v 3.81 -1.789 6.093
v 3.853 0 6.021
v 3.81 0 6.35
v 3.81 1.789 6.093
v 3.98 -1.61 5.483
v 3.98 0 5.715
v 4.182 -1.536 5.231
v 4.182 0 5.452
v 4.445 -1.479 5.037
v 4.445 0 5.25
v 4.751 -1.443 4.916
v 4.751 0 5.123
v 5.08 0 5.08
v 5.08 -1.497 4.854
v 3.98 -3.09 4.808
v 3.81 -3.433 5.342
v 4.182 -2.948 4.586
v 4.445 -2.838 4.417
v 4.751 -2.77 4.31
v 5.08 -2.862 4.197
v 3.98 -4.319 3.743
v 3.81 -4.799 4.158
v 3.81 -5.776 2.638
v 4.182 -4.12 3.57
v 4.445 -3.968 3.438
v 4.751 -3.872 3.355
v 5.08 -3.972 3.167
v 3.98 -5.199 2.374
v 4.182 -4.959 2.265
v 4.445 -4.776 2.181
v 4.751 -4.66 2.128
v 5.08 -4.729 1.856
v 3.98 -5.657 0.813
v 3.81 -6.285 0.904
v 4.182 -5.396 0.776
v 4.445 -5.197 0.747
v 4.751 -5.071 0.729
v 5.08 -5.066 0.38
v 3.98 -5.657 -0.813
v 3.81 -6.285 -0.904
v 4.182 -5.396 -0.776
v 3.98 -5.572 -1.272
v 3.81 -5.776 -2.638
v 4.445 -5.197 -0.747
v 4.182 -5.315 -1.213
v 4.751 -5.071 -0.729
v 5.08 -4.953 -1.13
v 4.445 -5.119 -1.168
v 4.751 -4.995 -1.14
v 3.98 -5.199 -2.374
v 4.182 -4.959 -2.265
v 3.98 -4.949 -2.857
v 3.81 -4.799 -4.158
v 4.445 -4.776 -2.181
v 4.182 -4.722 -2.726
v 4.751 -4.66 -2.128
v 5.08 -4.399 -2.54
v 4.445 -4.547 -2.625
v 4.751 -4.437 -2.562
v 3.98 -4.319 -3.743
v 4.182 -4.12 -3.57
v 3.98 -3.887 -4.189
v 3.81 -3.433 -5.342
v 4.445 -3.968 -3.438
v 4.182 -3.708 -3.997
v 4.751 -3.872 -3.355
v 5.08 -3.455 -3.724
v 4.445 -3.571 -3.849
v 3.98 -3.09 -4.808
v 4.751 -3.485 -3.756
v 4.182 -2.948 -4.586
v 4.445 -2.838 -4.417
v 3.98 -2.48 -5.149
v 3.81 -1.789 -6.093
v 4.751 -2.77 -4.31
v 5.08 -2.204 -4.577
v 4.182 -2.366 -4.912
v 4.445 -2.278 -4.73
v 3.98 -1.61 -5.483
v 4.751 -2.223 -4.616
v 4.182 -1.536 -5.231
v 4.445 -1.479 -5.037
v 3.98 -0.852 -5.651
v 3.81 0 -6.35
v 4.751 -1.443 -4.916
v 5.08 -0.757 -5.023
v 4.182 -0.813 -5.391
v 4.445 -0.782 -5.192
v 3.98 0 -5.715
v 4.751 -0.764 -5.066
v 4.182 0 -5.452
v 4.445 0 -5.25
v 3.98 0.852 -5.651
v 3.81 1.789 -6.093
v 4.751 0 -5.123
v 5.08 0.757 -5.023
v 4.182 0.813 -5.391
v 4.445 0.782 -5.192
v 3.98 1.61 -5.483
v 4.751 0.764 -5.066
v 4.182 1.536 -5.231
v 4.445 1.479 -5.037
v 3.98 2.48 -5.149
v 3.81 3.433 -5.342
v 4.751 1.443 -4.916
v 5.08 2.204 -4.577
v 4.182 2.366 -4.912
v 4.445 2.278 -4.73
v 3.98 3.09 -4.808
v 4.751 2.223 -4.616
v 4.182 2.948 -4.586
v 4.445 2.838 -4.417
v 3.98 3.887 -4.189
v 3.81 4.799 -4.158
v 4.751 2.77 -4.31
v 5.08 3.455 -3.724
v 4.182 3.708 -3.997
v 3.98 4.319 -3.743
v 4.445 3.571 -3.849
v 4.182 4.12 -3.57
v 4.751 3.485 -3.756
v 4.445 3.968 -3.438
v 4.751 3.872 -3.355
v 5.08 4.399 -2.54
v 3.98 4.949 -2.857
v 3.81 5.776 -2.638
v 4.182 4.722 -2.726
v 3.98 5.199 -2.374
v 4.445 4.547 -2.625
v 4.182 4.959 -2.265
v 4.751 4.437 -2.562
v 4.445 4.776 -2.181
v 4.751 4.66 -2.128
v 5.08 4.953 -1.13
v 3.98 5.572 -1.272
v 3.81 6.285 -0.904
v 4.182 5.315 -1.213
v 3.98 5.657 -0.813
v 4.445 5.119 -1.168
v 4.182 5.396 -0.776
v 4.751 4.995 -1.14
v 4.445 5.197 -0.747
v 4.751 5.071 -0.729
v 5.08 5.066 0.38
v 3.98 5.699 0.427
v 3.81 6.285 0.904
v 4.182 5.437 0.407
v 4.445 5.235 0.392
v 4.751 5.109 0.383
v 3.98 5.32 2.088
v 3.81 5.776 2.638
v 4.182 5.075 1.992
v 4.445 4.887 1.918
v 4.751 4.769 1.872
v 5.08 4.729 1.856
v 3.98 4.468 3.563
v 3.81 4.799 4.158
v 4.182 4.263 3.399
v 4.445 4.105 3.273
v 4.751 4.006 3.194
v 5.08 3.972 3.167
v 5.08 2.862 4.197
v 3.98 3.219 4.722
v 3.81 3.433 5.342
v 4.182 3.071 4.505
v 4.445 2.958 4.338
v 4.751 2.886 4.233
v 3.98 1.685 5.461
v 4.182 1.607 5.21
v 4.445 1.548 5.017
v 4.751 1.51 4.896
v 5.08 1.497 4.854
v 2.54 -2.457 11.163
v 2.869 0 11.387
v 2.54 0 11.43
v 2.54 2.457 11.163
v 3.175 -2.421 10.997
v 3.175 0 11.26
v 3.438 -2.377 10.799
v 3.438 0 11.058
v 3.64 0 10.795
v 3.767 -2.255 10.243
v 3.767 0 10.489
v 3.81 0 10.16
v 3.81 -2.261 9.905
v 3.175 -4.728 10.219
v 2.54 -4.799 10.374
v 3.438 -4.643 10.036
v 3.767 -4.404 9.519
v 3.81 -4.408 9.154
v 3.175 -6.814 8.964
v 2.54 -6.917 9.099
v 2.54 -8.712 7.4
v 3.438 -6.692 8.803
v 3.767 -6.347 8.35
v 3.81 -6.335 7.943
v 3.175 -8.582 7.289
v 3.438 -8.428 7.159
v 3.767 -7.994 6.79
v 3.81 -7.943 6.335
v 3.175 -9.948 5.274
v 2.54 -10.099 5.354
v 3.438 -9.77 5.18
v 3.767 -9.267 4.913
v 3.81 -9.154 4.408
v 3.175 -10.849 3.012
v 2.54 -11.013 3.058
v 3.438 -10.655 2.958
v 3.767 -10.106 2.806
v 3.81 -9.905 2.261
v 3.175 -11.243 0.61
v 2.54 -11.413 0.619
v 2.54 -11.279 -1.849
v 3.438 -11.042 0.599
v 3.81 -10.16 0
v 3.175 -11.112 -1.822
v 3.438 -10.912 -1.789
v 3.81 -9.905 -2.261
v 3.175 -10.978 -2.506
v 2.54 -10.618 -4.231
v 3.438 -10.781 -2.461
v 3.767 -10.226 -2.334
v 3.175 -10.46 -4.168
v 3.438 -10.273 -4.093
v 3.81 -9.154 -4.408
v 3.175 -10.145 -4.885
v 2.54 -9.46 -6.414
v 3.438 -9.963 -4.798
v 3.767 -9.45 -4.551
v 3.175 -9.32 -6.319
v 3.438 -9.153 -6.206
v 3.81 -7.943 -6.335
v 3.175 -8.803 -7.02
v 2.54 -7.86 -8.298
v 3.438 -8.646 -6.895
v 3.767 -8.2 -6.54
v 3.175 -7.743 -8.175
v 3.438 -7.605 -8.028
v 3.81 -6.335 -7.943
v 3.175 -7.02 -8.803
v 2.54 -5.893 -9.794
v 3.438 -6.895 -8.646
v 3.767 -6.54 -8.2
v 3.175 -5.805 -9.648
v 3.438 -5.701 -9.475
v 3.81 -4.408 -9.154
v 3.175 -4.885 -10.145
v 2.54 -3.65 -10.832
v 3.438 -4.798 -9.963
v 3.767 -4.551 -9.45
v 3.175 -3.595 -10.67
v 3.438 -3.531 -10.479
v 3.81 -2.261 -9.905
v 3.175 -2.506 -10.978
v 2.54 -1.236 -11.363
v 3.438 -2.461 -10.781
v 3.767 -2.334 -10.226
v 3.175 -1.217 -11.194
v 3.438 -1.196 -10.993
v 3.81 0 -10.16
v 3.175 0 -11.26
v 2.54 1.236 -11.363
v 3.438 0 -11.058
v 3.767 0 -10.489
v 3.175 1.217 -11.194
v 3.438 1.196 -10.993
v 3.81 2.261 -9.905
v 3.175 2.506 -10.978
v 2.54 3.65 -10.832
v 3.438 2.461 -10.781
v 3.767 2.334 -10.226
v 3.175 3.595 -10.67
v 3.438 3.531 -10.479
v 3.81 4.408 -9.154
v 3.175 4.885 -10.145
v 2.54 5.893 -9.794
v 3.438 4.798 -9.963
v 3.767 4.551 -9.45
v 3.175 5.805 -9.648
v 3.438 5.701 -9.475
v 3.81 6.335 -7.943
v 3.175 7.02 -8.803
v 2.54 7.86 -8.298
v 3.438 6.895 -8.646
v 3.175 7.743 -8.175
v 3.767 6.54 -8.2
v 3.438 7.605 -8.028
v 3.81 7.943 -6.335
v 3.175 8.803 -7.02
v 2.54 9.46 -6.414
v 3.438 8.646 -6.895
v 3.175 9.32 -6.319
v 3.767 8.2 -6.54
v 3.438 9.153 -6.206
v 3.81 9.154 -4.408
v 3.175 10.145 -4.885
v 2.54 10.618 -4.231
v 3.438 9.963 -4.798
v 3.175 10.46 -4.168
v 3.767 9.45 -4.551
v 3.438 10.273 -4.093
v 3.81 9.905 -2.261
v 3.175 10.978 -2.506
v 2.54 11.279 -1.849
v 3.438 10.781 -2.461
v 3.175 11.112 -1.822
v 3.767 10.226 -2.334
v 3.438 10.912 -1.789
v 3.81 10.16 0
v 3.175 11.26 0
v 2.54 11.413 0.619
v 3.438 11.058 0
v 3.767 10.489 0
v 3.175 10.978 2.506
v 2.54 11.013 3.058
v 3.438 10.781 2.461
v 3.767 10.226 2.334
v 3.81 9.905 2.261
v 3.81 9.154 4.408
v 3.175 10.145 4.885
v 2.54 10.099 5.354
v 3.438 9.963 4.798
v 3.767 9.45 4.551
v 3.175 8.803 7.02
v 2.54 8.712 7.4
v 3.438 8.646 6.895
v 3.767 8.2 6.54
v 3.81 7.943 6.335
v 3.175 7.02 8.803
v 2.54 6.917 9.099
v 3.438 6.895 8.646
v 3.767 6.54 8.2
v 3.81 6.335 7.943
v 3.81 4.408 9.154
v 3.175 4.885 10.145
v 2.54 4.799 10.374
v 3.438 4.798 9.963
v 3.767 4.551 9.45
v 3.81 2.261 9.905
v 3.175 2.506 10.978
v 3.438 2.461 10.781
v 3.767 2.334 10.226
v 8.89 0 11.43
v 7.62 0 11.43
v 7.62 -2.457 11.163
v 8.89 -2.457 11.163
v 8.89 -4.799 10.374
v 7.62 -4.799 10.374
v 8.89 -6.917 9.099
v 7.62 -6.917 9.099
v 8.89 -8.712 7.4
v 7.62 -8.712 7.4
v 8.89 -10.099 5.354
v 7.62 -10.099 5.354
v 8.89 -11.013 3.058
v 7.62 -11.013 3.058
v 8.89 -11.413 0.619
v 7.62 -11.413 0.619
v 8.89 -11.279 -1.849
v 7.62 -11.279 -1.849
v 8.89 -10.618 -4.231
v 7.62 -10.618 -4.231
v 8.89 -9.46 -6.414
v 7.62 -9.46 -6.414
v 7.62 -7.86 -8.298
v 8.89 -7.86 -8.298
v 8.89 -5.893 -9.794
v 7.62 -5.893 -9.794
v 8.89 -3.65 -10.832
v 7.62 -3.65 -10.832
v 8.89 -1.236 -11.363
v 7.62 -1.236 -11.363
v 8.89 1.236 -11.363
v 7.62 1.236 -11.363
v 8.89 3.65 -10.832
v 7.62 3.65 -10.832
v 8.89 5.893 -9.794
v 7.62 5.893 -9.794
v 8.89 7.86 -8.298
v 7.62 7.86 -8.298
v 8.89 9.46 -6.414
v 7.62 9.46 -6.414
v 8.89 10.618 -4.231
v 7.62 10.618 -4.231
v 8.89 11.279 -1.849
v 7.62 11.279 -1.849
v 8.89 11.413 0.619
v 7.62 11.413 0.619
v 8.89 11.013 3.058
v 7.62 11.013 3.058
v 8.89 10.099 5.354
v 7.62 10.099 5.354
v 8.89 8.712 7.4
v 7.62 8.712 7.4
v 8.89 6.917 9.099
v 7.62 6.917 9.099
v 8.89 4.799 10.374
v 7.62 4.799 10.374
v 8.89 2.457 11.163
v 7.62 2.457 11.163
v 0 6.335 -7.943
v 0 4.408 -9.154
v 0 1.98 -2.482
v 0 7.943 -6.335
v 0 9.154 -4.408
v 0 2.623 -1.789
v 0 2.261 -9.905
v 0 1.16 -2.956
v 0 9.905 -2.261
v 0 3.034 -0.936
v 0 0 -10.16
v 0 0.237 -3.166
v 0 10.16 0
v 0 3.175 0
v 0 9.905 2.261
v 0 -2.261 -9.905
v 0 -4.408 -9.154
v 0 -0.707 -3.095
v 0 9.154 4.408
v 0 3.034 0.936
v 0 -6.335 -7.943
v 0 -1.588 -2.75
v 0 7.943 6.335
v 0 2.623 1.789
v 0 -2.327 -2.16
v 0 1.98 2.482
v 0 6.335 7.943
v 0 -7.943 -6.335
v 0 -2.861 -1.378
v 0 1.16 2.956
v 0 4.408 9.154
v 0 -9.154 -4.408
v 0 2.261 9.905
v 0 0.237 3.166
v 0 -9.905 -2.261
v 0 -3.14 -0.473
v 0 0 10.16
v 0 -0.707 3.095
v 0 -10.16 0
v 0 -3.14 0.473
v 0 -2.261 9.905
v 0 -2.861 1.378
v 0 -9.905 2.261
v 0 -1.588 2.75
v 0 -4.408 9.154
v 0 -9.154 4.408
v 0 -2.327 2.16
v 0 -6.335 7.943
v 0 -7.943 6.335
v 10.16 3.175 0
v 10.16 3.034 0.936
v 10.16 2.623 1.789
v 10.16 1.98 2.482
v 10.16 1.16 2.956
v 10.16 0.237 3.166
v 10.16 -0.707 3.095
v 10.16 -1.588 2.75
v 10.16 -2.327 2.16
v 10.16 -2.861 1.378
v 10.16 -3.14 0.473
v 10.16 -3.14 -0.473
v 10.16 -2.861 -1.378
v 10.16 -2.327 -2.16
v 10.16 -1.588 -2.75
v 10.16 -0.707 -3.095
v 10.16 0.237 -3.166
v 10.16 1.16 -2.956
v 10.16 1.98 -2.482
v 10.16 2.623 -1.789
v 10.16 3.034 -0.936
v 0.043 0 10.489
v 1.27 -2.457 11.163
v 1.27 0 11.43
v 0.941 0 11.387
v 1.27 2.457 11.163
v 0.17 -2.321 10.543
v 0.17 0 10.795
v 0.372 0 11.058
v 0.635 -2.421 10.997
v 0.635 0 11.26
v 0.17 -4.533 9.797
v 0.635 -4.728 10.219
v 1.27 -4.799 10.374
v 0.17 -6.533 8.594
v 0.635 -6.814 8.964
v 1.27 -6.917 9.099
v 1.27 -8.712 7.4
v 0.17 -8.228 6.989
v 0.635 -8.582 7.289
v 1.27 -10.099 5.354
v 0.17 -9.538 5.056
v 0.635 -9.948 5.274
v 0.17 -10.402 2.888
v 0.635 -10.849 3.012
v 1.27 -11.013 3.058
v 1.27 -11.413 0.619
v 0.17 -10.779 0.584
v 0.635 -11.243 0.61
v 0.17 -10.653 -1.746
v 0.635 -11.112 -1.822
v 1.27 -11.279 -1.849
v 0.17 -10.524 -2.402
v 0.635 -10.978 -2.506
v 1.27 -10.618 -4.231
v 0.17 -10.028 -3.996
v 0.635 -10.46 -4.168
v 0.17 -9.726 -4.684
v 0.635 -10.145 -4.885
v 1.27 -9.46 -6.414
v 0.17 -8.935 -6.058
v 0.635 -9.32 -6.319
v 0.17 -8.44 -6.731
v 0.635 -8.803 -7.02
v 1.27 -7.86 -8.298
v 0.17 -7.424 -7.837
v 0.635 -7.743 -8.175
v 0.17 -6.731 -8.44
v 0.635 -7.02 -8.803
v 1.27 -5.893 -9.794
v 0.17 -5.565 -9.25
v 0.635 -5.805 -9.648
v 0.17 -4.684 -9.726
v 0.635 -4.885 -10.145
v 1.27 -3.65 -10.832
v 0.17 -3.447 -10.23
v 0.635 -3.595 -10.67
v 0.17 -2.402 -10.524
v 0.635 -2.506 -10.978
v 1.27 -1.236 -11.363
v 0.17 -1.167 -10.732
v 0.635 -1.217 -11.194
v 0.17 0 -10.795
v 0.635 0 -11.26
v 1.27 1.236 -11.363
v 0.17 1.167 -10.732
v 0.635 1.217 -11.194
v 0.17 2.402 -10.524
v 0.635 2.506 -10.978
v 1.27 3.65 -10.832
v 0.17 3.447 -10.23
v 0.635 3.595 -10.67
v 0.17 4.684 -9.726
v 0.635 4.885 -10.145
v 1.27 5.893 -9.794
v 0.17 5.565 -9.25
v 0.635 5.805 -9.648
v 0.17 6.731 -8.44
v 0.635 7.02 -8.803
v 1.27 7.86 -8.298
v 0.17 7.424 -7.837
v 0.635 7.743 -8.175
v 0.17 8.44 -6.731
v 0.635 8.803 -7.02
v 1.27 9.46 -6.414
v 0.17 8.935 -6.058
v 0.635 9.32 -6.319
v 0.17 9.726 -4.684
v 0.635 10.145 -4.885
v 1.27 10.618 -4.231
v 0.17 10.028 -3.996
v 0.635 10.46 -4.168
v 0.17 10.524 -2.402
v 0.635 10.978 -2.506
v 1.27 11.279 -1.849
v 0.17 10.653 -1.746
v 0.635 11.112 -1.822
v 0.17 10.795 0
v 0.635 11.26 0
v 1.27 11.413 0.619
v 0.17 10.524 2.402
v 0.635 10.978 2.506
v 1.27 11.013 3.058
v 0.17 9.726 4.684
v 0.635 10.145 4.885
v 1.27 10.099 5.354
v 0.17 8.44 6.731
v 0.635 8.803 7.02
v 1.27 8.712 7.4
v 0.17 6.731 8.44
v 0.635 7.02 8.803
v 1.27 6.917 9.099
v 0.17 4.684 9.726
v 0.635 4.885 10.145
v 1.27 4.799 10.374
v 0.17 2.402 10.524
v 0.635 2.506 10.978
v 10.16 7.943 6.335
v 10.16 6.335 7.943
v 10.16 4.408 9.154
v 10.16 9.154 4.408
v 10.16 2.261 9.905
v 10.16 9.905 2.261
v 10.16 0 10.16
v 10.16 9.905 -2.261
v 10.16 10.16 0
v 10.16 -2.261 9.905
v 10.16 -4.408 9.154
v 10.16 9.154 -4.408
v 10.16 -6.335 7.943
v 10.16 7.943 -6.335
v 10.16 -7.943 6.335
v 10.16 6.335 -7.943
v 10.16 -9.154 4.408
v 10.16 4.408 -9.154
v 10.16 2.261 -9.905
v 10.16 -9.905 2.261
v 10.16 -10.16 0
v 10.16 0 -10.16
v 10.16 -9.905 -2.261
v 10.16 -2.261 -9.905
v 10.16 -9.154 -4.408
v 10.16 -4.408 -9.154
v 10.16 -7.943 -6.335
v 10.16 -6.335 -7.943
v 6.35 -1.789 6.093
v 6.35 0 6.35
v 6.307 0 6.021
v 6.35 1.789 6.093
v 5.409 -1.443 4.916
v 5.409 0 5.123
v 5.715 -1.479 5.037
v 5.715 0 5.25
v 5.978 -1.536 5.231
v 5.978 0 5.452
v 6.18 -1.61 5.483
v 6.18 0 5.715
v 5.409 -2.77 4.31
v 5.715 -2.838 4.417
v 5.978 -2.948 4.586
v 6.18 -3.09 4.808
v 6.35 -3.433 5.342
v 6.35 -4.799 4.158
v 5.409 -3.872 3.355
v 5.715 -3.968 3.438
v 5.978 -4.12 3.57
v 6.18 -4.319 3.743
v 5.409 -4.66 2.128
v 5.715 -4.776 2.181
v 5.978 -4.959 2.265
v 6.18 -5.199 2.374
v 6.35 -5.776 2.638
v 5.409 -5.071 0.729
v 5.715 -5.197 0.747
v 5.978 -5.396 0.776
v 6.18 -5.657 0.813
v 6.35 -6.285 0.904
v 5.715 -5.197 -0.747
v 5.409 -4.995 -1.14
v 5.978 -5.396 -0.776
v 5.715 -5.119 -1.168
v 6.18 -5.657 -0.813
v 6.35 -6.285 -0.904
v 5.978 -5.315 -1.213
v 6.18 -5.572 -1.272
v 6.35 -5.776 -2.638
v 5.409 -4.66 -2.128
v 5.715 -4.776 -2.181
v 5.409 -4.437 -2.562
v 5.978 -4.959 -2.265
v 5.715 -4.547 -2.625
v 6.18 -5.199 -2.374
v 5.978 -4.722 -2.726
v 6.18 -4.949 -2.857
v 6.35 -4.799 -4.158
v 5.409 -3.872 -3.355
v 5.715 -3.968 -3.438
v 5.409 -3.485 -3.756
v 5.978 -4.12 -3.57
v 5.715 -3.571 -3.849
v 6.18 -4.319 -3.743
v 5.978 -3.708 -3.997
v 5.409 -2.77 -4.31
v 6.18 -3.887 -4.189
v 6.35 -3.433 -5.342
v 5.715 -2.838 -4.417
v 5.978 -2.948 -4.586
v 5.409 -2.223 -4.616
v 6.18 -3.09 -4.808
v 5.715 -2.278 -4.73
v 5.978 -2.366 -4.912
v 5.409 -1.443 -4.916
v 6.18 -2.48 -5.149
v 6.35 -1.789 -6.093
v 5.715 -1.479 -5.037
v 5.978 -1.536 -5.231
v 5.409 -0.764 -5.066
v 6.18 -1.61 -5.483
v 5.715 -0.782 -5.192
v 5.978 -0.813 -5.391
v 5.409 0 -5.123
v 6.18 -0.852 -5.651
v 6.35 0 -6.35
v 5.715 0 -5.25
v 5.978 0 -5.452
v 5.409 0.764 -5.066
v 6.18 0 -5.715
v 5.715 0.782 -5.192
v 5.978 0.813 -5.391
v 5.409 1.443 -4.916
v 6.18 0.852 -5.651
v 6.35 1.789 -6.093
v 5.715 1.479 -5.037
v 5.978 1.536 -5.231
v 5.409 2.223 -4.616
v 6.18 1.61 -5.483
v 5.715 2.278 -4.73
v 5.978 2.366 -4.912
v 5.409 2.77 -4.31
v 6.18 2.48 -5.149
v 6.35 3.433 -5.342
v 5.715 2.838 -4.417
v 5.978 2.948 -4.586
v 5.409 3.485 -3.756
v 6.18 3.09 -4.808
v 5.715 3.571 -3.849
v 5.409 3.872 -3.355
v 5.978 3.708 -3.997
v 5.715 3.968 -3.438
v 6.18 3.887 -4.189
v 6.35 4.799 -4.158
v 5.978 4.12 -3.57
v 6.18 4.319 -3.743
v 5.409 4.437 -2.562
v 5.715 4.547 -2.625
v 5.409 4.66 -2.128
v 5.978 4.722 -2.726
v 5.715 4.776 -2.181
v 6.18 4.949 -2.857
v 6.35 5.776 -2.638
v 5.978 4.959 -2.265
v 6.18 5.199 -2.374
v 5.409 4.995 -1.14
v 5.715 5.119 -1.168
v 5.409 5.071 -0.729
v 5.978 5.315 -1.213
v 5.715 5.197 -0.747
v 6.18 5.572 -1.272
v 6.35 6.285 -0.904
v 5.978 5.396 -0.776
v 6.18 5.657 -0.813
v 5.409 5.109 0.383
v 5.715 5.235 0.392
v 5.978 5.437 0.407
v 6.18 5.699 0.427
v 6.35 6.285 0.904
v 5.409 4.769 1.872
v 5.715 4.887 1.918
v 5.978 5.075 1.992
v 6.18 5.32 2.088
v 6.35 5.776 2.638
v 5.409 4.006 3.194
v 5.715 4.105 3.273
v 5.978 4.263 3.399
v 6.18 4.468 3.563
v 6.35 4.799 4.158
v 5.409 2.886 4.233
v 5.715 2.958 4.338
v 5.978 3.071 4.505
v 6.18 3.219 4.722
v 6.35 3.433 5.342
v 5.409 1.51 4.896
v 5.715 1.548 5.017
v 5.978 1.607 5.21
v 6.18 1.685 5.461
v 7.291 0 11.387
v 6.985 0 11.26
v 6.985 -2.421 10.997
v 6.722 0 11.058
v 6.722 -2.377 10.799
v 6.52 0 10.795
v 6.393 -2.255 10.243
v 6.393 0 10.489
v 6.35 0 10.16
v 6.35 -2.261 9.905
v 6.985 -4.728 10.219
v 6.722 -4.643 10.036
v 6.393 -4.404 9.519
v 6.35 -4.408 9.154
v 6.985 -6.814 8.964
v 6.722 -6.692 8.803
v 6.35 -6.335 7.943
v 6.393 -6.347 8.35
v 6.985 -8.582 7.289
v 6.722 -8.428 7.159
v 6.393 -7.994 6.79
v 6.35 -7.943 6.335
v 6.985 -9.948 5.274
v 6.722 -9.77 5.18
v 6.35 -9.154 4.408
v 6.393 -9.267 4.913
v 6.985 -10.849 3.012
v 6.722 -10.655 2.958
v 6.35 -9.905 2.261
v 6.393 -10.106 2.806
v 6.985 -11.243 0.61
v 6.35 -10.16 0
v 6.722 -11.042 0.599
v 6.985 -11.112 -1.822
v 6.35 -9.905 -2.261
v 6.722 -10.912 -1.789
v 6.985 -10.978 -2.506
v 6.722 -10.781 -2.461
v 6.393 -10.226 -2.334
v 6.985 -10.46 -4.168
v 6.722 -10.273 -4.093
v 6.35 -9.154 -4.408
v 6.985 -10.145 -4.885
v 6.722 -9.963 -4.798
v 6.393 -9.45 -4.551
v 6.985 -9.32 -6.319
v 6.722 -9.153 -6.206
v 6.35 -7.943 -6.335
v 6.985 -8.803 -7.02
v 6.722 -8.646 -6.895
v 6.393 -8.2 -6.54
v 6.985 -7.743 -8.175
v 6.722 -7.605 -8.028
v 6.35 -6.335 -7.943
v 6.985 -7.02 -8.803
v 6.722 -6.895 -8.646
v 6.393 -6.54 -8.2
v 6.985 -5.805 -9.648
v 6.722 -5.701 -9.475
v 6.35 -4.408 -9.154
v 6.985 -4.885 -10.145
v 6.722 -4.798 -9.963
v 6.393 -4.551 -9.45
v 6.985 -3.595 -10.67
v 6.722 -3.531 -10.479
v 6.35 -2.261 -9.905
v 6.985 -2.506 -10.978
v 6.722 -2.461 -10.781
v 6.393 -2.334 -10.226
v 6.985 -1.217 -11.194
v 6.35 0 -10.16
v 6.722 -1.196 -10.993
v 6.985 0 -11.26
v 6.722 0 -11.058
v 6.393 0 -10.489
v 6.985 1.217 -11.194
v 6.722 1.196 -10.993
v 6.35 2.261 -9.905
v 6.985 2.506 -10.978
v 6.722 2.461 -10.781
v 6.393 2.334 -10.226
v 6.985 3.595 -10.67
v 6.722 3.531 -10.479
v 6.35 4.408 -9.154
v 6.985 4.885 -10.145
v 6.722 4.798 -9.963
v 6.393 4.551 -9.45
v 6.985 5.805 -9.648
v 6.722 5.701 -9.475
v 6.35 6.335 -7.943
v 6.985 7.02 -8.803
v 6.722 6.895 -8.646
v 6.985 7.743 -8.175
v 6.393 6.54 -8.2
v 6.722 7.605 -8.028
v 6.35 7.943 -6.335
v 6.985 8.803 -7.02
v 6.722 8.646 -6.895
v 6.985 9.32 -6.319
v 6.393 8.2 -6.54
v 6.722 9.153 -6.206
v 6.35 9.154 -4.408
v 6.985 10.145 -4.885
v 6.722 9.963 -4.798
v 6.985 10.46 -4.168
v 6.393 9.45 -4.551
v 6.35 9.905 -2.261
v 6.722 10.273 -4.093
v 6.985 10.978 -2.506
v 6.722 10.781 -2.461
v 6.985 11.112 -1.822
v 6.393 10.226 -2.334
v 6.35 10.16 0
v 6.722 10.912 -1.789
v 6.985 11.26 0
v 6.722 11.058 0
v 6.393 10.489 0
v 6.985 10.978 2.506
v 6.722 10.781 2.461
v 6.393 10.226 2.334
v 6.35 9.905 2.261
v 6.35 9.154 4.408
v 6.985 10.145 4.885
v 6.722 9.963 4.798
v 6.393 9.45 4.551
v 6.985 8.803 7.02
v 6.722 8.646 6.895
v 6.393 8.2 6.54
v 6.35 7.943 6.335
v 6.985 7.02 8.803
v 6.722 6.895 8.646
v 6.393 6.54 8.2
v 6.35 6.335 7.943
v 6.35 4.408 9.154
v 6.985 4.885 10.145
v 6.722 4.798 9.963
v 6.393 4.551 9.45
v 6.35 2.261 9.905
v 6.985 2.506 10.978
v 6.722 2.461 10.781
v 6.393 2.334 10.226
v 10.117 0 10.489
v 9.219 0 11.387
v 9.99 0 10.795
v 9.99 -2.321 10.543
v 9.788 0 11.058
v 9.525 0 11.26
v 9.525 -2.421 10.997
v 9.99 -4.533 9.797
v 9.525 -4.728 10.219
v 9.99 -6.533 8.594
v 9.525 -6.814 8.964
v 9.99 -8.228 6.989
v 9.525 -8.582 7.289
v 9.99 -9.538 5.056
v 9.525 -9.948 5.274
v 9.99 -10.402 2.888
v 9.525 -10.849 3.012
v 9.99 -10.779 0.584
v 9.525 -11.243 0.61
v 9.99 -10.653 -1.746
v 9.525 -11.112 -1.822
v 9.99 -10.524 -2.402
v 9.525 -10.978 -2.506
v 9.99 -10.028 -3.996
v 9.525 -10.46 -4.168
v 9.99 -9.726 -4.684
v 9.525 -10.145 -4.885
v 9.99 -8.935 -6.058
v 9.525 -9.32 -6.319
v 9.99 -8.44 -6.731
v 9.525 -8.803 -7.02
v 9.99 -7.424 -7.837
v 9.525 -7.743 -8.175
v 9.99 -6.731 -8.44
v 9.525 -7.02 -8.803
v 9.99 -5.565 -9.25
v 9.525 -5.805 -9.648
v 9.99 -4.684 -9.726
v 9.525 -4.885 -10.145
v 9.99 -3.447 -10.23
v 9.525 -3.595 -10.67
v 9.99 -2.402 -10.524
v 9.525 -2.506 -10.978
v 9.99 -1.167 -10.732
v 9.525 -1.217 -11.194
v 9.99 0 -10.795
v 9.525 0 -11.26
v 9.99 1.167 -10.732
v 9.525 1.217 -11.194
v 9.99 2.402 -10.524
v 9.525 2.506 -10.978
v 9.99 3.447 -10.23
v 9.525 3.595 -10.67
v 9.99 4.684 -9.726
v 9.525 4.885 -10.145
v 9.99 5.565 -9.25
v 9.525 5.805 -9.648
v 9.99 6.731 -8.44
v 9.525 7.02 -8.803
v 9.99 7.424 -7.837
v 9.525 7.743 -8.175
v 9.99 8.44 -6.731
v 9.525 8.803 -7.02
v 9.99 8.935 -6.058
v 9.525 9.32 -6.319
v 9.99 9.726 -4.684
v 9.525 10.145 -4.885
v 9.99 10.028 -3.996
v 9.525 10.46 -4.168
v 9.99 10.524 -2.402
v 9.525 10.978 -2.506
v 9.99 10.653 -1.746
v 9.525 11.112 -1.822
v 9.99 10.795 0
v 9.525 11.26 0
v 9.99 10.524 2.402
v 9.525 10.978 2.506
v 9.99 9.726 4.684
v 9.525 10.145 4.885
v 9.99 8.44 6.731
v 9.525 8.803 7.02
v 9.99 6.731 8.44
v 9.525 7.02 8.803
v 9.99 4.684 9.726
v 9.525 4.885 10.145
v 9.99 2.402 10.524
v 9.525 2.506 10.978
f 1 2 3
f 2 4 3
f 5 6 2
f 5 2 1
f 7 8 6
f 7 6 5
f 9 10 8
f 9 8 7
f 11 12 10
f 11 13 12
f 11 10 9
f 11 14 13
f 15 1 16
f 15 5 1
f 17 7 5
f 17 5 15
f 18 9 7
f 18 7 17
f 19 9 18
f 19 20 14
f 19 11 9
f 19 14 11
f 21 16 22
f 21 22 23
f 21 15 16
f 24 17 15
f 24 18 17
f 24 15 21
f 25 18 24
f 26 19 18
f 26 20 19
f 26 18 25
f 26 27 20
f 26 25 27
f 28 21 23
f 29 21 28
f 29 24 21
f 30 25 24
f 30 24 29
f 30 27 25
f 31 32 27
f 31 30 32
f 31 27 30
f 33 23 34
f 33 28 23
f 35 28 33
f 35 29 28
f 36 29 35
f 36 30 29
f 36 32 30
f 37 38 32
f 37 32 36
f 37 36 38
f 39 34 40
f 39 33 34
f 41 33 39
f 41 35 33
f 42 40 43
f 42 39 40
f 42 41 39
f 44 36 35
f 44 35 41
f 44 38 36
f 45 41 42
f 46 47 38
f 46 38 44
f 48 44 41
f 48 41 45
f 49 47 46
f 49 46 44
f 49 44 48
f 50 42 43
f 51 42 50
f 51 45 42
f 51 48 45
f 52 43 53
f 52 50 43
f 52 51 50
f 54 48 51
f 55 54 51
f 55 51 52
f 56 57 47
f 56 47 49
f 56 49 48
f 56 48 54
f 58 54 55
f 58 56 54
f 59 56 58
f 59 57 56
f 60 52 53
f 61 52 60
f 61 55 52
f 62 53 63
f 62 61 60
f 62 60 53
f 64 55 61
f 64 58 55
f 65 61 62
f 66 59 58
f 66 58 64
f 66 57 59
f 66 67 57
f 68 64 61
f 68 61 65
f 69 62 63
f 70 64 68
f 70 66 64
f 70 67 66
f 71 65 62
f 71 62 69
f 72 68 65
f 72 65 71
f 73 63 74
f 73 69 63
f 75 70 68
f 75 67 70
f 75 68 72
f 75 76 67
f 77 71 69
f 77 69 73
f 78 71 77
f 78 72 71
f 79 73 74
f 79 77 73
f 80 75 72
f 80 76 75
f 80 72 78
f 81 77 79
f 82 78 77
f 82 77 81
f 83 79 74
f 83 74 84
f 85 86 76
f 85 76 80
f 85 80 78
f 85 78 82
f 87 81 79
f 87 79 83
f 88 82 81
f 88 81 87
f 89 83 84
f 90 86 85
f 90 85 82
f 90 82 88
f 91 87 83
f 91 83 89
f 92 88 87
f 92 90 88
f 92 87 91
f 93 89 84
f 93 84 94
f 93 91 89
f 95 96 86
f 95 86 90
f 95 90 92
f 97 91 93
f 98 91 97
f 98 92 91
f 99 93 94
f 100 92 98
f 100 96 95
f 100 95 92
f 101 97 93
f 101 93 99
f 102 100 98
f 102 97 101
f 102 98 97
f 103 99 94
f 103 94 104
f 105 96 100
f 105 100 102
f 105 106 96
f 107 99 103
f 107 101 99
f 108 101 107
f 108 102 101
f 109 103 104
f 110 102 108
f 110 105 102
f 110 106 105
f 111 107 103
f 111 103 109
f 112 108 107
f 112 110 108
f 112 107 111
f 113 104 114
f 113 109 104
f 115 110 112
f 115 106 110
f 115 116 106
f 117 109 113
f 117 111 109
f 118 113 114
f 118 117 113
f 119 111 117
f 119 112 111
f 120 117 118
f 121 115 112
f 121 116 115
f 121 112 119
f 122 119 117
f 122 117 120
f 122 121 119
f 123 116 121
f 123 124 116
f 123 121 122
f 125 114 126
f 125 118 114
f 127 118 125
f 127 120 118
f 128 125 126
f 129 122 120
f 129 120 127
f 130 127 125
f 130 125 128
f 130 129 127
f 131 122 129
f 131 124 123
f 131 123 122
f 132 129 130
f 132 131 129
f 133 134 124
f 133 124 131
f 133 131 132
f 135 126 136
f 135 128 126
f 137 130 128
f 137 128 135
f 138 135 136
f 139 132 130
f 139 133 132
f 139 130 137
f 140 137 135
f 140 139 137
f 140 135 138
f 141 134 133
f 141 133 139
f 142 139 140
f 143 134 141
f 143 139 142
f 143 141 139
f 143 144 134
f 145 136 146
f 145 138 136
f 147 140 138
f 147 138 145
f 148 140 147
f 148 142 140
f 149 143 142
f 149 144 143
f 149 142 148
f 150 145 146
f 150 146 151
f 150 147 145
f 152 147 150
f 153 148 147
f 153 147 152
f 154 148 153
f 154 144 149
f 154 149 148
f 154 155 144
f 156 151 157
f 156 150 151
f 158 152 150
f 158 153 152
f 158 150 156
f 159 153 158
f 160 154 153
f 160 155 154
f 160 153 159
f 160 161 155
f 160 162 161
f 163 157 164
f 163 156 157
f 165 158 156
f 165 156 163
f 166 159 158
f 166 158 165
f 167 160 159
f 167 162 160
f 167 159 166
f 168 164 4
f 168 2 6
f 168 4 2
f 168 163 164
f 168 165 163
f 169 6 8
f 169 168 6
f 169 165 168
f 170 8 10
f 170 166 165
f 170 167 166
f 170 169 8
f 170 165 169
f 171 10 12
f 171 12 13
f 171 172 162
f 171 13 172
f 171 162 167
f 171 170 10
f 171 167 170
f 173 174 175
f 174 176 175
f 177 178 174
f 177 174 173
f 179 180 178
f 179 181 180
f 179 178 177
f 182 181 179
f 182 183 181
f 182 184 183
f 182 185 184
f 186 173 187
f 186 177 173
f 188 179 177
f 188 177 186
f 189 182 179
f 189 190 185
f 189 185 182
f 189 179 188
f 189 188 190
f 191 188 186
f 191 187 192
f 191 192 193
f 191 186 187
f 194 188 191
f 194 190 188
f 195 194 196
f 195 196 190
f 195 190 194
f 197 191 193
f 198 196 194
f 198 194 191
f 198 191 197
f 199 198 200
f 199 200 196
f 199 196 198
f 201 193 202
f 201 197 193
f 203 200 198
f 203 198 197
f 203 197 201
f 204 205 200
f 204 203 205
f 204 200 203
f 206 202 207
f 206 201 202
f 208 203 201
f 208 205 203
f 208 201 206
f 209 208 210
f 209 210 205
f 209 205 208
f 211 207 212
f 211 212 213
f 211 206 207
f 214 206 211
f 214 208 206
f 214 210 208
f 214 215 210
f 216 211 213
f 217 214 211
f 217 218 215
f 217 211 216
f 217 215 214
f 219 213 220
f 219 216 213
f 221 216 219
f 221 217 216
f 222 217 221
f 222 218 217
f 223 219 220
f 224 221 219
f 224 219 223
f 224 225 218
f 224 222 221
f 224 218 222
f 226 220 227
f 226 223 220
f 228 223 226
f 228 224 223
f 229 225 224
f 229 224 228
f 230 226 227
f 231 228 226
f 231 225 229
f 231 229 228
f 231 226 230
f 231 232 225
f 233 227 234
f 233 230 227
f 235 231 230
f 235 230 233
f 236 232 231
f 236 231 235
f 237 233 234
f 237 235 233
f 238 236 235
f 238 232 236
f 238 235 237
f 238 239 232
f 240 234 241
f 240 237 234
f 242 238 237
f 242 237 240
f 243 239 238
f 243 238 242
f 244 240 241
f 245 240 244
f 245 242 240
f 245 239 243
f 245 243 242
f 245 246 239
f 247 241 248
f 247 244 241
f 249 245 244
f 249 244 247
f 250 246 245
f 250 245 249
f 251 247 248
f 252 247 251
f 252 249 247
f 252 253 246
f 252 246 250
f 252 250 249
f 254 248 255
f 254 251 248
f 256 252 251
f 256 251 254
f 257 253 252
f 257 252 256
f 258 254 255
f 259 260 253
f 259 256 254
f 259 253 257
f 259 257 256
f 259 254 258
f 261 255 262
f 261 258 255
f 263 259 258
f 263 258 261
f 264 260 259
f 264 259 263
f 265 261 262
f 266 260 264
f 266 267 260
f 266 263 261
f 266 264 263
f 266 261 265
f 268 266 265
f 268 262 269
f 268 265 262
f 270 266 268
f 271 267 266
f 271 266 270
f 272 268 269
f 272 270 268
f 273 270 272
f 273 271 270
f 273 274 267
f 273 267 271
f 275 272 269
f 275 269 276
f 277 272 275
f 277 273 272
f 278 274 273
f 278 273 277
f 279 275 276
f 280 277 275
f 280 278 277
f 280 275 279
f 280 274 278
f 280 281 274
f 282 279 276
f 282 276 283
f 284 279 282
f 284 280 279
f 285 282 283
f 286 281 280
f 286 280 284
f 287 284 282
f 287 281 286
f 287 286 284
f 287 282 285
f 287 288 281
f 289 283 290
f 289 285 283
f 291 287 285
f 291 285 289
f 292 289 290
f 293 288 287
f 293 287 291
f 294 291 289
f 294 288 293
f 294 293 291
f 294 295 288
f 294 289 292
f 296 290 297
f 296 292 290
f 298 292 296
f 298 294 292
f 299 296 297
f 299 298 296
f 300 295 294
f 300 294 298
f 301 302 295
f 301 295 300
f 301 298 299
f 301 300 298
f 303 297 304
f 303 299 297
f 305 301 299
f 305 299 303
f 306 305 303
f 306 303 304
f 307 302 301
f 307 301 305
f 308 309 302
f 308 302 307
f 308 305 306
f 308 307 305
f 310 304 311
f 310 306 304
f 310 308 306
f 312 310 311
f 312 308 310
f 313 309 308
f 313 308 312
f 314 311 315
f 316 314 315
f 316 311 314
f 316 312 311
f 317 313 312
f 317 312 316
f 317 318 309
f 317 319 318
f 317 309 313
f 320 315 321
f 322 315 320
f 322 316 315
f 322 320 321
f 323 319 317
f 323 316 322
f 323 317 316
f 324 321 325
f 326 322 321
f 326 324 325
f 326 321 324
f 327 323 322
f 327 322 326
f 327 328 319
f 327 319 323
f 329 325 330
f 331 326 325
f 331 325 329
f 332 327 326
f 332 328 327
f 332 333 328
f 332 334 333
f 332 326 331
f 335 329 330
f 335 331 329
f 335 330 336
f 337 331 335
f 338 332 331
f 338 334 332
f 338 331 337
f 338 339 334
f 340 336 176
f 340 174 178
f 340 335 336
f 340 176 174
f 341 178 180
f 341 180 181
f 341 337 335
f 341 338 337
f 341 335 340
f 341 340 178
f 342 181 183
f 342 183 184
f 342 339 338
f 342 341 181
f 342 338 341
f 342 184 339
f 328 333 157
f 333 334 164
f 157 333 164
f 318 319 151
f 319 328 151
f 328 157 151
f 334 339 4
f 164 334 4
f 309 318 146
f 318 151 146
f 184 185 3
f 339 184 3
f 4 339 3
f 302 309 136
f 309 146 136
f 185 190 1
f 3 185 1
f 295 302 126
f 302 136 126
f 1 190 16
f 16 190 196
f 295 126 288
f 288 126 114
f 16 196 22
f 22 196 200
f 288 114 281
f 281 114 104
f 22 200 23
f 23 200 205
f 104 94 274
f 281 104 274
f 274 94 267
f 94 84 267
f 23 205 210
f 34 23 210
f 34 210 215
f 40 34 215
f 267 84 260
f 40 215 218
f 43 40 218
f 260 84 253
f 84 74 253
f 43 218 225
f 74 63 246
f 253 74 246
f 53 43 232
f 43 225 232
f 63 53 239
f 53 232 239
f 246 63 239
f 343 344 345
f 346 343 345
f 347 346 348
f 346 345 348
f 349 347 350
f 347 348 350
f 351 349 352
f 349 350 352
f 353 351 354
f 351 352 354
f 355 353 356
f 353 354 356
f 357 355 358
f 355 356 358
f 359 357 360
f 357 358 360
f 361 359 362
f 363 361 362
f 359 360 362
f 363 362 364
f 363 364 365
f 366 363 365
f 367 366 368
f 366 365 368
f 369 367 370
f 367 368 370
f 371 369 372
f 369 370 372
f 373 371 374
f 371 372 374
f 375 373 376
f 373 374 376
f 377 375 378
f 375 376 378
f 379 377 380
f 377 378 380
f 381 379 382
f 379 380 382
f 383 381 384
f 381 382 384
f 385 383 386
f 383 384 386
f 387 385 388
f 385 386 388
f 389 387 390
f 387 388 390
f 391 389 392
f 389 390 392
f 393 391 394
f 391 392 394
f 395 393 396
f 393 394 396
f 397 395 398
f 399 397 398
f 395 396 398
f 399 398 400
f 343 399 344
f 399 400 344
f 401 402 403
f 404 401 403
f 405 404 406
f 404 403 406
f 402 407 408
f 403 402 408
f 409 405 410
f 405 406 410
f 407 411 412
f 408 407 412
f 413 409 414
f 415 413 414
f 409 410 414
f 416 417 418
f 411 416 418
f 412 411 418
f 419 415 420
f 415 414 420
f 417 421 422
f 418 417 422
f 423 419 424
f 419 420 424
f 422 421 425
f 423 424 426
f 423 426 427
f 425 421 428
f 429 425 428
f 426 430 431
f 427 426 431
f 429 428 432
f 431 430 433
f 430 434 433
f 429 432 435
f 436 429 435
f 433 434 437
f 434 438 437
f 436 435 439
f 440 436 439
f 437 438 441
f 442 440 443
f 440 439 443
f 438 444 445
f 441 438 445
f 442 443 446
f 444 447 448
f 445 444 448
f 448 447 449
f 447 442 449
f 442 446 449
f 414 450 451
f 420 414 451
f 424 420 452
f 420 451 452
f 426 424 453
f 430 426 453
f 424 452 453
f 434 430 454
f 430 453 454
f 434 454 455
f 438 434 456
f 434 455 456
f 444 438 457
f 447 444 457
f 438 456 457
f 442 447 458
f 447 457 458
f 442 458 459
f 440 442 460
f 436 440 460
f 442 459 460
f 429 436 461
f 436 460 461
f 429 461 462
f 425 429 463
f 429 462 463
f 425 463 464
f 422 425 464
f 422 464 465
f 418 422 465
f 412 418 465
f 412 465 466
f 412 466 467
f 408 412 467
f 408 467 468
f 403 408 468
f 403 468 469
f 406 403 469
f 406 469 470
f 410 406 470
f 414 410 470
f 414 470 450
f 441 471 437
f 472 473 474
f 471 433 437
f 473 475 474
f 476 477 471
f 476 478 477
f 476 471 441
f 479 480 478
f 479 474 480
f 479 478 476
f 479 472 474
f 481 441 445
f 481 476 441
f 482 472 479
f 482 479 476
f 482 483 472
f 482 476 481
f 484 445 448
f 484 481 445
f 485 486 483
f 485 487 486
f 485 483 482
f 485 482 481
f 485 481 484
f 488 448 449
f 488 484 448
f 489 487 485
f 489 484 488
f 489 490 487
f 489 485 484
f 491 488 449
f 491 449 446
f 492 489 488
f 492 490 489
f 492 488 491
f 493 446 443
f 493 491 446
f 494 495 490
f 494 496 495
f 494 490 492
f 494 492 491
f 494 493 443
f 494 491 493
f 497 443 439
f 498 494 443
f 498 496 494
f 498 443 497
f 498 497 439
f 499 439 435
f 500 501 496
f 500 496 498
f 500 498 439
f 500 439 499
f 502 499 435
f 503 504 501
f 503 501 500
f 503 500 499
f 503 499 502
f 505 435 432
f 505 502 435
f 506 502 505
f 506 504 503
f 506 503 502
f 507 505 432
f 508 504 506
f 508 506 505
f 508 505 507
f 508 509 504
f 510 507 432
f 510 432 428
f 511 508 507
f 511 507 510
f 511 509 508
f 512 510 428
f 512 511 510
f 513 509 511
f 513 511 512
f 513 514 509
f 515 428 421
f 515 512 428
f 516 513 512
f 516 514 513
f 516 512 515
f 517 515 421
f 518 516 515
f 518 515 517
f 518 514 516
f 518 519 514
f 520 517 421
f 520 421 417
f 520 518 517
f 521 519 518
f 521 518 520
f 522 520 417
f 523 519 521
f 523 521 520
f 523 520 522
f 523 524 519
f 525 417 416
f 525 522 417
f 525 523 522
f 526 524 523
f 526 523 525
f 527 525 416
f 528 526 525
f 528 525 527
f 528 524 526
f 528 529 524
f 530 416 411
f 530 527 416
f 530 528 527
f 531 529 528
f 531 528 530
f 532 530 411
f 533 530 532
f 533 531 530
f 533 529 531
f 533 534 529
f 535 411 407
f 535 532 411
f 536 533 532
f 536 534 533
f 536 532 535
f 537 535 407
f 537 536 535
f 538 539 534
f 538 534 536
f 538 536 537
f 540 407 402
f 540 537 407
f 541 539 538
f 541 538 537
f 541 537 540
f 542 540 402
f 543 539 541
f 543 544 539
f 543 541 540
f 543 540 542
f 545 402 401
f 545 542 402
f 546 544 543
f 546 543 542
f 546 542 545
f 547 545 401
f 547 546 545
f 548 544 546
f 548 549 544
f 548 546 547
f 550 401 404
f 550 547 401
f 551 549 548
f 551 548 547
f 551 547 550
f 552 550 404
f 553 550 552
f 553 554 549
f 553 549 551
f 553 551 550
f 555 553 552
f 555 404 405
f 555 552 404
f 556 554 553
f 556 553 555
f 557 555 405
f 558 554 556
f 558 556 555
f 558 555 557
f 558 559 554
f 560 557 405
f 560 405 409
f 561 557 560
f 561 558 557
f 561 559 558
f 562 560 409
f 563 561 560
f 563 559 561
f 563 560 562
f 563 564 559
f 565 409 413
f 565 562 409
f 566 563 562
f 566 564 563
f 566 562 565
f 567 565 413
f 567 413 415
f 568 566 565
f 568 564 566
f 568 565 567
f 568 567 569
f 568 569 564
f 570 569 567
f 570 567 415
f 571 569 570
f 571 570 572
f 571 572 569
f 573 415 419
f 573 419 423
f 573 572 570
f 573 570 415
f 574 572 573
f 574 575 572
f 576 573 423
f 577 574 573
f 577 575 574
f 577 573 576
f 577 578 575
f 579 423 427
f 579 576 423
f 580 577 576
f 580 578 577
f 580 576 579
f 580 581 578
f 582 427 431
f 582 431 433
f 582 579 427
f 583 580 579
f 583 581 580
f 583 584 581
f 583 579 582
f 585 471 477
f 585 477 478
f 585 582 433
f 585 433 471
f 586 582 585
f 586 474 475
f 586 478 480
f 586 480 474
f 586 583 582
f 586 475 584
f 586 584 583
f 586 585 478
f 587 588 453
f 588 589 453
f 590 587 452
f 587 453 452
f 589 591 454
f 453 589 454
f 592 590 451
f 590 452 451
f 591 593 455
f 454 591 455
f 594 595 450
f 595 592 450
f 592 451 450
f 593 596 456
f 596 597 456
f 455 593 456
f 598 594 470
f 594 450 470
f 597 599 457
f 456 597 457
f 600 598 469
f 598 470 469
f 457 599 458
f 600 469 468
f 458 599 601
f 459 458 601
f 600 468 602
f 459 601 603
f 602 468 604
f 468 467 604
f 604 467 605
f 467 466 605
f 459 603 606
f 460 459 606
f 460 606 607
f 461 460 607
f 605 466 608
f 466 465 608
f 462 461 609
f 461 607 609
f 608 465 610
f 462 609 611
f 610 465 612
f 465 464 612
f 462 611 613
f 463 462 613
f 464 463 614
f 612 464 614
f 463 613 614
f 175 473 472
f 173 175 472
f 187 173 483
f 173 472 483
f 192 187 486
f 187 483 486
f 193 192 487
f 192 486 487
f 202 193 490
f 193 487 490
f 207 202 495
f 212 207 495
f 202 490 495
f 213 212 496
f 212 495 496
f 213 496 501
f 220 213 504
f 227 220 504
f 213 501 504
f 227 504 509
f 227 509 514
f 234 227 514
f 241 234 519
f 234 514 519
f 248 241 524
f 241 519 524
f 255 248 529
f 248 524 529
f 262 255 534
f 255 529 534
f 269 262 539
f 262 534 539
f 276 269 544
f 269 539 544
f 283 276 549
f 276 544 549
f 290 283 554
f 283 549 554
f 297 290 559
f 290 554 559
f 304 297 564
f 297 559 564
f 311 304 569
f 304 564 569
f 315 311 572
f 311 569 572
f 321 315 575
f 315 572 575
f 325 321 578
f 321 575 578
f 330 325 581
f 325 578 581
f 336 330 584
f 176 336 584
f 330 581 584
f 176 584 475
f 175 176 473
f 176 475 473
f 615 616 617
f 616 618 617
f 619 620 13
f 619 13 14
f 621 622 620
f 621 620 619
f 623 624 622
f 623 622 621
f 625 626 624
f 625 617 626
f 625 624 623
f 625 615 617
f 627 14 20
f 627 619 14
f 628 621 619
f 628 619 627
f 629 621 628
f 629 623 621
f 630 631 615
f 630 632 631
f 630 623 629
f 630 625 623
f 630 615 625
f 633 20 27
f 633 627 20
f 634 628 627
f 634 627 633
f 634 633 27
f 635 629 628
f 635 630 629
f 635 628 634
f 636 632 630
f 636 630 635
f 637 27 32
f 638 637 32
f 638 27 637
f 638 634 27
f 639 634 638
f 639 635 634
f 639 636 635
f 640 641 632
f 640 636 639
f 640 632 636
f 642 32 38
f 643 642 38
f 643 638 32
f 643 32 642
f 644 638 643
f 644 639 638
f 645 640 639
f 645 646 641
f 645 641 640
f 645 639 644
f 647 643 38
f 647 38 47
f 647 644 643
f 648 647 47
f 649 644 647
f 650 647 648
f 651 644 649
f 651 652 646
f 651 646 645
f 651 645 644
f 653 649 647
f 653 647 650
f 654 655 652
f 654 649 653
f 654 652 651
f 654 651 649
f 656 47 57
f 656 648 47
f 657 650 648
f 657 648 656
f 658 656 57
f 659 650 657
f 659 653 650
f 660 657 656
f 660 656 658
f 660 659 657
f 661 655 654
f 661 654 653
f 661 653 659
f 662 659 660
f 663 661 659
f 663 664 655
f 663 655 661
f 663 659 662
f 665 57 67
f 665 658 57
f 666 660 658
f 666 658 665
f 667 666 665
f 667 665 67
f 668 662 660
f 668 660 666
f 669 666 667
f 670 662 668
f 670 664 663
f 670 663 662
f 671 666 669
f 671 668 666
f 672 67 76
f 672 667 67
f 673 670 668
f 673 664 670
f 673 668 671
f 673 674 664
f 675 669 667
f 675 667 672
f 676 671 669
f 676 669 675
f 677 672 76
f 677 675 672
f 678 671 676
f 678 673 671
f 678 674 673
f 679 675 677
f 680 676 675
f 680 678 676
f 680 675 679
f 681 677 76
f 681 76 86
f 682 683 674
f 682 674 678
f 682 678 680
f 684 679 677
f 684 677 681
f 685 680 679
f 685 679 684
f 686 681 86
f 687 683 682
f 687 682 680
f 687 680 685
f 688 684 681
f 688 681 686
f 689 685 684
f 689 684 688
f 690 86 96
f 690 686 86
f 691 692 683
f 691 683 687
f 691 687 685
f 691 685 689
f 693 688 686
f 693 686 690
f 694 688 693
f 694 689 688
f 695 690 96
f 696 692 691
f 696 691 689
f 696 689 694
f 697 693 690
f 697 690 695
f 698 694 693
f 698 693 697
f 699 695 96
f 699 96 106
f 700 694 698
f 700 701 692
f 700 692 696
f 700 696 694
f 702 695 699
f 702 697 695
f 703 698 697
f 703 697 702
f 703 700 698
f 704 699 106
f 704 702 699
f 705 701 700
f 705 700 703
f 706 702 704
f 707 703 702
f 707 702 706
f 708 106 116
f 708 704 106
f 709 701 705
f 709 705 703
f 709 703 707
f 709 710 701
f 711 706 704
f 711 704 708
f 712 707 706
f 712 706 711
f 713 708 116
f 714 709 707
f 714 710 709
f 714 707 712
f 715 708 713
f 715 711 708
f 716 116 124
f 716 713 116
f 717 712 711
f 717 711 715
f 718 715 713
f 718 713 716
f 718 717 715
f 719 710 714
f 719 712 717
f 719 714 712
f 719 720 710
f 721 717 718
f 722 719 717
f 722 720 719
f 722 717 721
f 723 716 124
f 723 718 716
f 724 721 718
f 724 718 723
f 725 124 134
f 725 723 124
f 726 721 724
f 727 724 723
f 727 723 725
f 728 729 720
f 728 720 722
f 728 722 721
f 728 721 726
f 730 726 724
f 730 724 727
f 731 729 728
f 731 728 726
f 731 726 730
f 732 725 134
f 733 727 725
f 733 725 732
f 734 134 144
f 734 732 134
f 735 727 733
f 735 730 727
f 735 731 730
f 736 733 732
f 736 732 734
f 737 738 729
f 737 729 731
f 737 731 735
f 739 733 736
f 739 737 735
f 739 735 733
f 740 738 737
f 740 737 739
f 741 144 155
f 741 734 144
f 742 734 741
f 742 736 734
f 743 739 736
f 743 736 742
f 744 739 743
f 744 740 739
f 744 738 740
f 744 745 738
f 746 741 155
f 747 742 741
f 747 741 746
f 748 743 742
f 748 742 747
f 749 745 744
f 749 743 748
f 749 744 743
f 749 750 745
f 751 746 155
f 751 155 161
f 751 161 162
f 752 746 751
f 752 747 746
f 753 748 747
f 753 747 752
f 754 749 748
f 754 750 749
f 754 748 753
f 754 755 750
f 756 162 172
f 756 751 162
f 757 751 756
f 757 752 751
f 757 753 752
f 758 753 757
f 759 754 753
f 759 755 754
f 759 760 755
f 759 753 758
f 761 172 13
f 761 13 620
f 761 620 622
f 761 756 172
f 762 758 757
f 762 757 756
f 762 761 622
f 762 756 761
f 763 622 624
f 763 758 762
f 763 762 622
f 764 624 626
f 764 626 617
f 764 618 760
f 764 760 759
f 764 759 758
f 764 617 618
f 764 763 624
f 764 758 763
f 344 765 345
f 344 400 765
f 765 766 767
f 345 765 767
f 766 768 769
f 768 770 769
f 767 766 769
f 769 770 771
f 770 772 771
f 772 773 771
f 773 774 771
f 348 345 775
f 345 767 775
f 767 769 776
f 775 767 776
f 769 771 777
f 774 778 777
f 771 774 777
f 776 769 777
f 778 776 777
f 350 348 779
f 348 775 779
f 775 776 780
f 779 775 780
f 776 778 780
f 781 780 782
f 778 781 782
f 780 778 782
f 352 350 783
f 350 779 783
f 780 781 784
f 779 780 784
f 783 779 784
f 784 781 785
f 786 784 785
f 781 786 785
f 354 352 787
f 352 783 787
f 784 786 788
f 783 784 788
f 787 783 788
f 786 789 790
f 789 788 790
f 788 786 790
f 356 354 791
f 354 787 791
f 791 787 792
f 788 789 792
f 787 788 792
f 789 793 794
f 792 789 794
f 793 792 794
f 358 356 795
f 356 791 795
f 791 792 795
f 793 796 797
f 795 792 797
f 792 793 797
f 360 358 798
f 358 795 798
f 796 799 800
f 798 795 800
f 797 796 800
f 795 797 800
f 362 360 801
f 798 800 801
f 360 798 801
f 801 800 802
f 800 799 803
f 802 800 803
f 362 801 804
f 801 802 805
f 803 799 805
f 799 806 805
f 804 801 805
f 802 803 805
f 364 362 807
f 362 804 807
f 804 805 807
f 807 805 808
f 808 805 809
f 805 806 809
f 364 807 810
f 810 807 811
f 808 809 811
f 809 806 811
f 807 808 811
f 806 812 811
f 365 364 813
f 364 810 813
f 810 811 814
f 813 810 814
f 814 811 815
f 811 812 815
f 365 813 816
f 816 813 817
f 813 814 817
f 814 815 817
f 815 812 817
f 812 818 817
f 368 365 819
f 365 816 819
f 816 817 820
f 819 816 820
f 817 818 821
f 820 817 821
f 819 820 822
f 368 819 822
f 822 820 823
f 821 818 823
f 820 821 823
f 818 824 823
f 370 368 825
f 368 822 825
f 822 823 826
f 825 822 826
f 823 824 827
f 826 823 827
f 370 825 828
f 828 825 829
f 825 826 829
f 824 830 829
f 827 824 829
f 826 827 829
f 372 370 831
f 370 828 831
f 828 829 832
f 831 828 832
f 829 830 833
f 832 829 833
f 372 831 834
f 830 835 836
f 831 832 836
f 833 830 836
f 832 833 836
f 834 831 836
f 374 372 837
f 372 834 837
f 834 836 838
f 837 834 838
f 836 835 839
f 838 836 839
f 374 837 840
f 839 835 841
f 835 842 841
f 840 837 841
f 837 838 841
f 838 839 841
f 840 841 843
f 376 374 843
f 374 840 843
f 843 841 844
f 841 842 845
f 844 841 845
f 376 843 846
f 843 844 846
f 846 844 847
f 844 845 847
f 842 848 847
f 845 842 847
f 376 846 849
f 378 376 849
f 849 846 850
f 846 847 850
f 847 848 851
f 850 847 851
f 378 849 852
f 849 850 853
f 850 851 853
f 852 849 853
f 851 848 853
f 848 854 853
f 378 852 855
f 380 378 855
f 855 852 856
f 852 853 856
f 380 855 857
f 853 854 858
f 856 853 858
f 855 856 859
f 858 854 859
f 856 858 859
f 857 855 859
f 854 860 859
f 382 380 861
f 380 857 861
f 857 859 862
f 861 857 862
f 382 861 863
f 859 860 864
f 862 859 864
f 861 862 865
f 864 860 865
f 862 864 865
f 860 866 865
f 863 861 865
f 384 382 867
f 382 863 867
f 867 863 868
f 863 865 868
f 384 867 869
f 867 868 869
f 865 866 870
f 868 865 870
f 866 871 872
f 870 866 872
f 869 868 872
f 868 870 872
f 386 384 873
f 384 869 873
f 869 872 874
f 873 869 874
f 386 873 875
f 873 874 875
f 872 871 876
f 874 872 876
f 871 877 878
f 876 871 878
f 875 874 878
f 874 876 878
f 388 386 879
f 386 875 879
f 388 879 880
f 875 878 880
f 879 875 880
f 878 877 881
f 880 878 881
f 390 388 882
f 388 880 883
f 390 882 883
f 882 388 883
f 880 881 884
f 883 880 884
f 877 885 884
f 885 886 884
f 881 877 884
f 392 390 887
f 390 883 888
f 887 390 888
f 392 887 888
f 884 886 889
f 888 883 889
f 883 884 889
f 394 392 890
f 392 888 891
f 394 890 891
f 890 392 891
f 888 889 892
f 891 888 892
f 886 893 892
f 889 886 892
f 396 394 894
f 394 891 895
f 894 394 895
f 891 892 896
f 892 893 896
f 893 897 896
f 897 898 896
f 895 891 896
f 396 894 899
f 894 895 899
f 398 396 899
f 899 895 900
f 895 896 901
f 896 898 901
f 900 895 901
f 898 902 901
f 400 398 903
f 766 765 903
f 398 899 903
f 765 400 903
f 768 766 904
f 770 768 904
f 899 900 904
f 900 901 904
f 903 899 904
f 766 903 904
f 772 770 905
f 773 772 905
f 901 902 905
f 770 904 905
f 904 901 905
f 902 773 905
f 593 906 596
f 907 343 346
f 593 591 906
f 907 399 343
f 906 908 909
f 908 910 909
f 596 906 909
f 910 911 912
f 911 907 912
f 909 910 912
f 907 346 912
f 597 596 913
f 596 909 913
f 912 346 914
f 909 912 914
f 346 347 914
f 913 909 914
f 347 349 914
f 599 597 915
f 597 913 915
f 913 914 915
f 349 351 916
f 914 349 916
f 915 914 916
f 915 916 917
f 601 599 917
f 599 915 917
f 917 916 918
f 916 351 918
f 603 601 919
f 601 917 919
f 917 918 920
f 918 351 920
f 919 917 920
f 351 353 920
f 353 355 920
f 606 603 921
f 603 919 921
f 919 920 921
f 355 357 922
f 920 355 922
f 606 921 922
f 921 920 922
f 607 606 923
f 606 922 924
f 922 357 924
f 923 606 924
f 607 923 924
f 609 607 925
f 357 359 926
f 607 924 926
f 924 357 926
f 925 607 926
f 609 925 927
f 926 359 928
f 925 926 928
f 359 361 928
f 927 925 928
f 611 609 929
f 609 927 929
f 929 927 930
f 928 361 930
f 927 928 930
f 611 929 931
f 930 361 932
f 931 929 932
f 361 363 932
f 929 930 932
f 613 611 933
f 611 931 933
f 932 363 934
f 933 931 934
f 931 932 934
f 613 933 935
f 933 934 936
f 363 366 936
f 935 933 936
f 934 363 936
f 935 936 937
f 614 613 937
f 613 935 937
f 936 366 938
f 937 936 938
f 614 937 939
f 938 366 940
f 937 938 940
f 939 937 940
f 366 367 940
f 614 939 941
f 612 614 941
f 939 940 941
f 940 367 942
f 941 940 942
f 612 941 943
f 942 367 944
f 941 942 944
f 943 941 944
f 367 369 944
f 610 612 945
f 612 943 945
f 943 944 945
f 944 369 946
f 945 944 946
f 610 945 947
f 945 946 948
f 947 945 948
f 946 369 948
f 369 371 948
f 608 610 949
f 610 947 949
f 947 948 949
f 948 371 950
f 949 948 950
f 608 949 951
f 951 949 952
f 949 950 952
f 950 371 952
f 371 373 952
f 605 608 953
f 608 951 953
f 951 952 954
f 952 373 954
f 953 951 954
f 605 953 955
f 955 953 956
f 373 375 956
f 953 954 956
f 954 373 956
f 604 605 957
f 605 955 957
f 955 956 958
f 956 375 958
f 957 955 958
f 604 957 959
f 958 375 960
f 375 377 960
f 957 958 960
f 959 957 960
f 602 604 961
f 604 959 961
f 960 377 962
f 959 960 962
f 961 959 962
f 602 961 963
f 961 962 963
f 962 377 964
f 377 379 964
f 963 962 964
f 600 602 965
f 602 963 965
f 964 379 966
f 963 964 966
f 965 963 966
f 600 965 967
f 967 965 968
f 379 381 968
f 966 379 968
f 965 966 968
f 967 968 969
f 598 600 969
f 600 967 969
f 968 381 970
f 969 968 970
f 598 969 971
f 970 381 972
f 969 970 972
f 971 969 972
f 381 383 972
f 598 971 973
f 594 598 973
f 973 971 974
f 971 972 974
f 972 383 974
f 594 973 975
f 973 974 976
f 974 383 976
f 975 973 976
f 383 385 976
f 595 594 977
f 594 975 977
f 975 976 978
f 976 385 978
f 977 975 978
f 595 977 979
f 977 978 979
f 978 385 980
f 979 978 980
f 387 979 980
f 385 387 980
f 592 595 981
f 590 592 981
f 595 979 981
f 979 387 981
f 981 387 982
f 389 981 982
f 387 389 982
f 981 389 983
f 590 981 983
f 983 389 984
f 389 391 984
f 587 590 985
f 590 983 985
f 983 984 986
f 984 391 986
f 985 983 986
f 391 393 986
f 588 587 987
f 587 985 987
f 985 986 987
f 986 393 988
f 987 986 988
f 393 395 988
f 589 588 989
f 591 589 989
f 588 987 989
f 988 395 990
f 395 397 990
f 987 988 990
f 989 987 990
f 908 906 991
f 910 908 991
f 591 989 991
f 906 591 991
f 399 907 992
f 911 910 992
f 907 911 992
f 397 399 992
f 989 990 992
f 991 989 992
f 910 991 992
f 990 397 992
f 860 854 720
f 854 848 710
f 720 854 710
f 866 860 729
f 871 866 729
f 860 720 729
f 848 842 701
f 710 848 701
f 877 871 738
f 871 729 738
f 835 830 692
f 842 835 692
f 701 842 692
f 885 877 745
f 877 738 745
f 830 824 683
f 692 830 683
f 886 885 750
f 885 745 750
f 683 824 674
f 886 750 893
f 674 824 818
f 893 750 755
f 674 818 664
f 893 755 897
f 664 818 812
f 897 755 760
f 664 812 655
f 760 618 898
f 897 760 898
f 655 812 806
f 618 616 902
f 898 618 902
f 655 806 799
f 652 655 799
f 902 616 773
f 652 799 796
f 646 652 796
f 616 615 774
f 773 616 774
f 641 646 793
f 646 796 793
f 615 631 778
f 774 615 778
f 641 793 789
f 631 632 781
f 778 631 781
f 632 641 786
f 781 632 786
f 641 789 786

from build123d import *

# Parameters (mm, degrees)
F2_R     = 3.175
F3_DEPTH = 25.4
F4_R     = 1.26999


# Not quite as in the source:
# - a fillet or chamfer is up to 0.001 mm smaller than in the source, because OpenCascade refuses the exact size


with BuildPart() as f1:
    # F0 (on Front) → F1 (revolve)
    with BuildSketch(Plane.XZ):
        Polygon((0, 11.43), (0, 0), (10.16, 0), (10.16, 11.43), (6.35, 11.43), (6.35, 5.08), (3.81, 5.08), (3.81, 11.43), align=None)
    revolve(axis=Axis((5.08, 0, 0), (1, 0, 0)))

    # F2 (on face) → F3 (cut)
    with BuildSketch(Plane.YZ.offset(10.16)):
        Circle(F2_R)
    extrude(amount=-F3_DEPTH, mode=Mode.SUBTRACT)

    # F4 (radius 1.27 in the source; OpenCascade refuses exactly that, so slightly less here)
    f4_edges = [f1.edges().sort_by_distance(p)[0] for p in [
        (6.35, 0, -5.08),
        (3.81, 0, -5.08),
        (3.81, 0, -11.43),
        (0, 0, -11.43),
        (10.16, 0, -11.43),
        (6.35, 0, -11.43),
    ]]
    fillet(f4_edges, radius=F4_R)


solid = f1.part
